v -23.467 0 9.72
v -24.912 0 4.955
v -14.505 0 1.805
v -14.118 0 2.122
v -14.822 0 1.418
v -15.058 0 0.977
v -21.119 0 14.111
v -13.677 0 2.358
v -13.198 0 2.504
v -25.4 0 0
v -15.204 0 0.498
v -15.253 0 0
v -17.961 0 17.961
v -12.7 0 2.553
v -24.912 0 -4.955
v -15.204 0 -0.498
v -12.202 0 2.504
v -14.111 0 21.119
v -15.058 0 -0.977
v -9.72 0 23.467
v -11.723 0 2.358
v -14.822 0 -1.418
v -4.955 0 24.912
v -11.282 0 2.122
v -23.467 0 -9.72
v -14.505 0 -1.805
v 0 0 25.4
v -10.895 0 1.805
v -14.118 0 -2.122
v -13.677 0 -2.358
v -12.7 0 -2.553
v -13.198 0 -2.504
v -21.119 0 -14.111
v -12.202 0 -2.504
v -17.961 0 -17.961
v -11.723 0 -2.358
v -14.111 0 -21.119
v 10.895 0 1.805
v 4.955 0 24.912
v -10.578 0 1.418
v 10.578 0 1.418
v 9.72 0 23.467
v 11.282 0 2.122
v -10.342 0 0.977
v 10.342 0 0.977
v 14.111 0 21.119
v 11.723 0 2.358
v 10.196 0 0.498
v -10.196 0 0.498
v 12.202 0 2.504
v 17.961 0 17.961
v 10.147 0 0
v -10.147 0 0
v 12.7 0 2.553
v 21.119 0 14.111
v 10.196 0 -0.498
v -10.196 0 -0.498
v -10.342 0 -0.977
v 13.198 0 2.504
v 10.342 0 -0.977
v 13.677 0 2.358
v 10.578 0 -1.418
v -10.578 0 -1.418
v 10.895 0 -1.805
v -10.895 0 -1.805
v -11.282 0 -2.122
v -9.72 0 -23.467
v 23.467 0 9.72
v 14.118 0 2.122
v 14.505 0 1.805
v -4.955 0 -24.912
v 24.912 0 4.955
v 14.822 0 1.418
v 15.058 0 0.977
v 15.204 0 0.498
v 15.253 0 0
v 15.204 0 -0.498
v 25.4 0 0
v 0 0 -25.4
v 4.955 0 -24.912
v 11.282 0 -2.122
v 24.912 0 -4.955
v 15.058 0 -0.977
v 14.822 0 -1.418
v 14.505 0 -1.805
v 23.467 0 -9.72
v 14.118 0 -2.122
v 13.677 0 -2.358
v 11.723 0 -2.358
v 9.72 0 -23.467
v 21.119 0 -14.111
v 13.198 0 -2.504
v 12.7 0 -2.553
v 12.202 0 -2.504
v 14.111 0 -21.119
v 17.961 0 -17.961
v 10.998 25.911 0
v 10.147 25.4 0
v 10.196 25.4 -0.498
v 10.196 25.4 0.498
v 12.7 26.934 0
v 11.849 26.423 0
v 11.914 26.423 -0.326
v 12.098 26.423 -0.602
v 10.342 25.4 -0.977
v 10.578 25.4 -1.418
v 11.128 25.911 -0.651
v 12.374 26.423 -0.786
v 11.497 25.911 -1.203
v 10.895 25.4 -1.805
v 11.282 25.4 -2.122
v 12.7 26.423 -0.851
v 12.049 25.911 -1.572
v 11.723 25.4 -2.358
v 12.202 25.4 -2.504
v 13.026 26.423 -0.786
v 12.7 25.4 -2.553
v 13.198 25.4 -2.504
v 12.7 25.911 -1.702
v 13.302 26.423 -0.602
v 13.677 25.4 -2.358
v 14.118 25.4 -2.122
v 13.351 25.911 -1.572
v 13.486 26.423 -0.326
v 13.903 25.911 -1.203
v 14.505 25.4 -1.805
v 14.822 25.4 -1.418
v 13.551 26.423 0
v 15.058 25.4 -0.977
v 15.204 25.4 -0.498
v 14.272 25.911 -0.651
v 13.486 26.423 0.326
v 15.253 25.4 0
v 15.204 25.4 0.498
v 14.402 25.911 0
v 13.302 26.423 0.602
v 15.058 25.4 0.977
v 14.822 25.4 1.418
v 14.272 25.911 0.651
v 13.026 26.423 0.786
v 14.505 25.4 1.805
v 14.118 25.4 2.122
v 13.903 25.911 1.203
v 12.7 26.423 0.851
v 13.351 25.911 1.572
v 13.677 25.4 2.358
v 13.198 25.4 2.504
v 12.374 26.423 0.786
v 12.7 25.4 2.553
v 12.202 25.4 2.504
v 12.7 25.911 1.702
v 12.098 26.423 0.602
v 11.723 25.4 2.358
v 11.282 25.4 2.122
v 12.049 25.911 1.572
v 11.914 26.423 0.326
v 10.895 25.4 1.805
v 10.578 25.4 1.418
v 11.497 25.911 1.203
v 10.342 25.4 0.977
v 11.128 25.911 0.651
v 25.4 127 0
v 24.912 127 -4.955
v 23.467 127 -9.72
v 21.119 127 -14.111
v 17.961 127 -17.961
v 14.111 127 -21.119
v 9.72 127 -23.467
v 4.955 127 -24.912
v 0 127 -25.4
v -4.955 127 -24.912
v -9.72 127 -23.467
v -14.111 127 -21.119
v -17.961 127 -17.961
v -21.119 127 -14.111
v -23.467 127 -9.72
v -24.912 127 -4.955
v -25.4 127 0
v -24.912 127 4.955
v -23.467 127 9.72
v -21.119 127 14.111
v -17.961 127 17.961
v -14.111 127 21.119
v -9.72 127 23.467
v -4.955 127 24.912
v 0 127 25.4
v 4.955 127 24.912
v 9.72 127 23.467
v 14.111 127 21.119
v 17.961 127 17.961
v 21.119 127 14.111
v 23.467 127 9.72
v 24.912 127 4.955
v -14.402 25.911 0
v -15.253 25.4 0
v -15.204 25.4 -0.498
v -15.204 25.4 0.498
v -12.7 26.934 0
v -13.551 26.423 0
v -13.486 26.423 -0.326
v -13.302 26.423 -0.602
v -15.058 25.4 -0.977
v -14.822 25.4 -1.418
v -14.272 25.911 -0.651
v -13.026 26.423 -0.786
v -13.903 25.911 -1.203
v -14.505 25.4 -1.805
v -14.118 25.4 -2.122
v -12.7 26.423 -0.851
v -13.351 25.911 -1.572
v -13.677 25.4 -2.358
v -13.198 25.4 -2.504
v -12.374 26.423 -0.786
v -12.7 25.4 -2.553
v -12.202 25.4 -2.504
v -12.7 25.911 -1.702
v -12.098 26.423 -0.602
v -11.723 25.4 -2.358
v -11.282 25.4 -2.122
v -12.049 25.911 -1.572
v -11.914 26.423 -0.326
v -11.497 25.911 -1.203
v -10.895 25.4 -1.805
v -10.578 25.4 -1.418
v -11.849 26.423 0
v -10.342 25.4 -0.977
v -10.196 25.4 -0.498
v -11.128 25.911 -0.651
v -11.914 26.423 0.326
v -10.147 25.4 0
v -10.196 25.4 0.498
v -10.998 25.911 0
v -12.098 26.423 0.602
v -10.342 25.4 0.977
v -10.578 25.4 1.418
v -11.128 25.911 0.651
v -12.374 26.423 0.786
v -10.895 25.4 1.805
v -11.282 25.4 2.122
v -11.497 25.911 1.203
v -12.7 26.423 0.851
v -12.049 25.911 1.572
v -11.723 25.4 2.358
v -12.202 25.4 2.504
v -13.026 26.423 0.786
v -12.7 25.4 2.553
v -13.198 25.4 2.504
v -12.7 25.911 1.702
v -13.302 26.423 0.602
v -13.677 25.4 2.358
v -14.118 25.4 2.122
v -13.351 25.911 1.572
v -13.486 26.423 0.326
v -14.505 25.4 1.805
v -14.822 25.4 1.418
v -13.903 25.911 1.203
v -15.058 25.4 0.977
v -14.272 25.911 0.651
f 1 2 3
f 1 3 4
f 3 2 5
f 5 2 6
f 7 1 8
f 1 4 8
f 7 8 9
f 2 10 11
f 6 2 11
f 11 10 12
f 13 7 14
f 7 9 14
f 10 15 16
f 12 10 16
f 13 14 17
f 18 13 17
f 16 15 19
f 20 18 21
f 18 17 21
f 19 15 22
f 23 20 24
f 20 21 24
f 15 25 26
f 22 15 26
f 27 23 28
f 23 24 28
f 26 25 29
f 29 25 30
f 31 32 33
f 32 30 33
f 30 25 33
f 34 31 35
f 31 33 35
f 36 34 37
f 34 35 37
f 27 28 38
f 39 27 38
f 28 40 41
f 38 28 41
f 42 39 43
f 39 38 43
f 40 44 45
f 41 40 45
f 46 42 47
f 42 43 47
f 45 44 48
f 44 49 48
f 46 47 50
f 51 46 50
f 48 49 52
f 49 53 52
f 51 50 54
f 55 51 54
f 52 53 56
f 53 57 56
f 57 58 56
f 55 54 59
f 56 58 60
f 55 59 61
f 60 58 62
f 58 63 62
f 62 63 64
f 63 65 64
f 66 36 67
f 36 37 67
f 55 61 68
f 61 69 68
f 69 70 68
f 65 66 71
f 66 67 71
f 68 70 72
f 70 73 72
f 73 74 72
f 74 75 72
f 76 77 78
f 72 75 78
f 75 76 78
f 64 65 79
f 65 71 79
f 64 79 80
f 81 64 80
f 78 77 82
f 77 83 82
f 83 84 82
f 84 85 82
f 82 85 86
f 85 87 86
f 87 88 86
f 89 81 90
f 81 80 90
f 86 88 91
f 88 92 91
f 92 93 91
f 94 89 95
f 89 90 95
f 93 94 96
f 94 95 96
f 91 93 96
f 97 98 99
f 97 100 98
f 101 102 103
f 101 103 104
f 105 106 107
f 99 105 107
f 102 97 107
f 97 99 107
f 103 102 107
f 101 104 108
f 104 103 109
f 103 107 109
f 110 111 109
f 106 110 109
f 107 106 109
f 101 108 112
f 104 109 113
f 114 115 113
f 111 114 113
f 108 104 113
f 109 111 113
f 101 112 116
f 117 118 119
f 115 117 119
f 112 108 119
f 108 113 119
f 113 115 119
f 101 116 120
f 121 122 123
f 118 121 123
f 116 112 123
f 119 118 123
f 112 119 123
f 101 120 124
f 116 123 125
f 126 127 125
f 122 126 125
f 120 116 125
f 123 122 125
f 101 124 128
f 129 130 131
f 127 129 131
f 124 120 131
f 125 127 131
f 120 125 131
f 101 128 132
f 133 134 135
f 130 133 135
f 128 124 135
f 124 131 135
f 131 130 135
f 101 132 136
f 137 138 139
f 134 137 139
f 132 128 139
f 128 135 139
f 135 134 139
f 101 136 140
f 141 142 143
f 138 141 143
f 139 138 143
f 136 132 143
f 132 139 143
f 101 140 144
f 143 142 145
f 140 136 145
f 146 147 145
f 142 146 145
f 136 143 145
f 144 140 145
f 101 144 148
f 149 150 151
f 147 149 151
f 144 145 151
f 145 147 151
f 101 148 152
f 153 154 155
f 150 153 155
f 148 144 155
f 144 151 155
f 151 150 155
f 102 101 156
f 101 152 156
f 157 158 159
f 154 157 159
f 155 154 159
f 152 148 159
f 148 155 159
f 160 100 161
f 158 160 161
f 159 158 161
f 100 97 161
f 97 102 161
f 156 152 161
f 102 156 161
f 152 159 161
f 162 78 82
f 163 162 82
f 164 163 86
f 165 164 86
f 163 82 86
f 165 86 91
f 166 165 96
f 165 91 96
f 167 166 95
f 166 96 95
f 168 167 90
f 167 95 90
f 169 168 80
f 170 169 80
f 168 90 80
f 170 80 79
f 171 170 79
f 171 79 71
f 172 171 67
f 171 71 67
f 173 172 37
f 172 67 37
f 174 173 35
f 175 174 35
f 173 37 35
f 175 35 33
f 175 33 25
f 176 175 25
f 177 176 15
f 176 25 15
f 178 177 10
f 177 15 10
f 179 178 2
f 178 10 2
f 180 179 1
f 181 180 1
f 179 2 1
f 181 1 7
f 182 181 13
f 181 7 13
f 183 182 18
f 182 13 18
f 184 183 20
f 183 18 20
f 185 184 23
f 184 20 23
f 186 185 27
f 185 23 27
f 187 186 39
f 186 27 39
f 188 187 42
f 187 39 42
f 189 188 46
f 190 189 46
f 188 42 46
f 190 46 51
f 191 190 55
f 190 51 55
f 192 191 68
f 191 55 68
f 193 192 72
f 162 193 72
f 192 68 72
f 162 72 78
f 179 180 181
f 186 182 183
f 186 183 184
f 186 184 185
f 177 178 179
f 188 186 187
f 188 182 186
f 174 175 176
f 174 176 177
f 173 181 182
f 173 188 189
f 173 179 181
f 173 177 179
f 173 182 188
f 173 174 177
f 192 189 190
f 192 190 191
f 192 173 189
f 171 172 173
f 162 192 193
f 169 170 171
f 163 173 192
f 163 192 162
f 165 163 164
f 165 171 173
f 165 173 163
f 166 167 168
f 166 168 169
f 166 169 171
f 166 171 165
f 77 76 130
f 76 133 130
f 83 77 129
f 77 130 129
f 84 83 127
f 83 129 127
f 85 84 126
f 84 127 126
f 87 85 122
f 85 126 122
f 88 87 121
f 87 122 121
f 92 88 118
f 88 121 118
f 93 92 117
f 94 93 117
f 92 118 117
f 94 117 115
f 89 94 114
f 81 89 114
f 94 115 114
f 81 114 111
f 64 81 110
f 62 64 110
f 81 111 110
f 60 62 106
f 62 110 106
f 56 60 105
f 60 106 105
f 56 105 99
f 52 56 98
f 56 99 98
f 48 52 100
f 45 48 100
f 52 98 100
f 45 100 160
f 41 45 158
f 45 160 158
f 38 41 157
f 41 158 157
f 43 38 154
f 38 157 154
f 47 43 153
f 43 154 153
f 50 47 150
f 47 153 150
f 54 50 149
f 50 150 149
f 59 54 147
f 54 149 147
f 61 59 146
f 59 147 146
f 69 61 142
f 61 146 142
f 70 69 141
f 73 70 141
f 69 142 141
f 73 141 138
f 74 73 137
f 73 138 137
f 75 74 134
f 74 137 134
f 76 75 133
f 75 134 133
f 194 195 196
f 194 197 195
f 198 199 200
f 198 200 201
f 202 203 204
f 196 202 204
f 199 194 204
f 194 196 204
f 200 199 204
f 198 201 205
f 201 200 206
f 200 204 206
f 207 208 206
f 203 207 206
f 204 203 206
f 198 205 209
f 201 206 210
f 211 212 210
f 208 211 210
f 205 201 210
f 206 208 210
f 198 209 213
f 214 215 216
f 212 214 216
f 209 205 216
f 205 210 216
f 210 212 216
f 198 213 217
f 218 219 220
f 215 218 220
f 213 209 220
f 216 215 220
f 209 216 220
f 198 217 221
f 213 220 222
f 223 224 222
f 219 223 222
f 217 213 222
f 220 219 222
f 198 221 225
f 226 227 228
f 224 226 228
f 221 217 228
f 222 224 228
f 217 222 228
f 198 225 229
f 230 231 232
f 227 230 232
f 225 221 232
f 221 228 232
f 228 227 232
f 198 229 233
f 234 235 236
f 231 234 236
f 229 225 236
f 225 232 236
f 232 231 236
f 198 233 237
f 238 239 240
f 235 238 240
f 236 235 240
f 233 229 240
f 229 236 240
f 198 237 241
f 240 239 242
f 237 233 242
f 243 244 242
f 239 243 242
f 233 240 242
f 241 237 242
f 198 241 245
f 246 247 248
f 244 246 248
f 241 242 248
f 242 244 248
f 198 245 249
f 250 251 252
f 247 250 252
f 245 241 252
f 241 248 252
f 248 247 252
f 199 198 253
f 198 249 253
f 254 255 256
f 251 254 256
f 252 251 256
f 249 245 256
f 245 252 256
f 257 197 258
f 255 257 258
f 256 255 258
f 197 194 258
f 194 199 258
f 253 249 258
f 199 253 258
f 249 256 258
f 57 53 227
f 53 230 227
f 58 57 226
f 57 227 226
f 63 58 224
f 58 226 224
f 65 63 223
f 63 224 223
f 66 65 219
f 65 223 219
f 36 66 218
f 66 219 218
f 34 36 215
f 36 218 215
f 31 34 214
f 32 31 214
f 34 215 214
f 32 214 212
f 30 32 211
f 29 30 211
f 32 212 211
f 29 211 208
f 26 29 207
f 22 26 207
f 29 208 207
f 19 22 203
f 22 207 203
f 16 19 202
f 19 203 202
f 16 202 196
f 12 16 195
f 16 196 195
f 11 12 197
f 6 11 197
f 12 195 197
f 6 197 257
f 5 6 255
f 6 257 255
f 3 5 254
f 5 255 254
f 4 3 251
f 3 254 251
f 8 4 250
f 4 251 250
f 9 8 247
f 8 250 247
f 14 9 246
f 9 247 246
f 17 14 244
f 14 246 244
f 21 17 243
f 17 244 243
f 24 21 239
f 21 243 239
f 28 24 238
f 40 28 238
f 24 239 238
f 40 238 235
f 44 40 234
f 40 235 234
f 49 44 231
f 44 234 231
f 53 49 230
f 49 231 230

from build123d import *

# Parameters (mm, degrees)
SKETCH1_R                   = 25.4
BOSS_EXTRUDE1_DEPTH         = 127
F_1_4_20_TAPPED_HOLE1_D     = 5.1054
F_1_4_20_TAPPED_HOLE1_DEPTH = 25.4
F_1_4_20_TAPPED_HOLE1_TIP   = 1.533816902


with BuildPart() as part:
    # Sketch1 → Boss-Extrude1 (new body)
    with BuildSketch(Plane(origin=(0, 0, 0), x_dir=(1, 0, 0), z_dir=(0, 1, 0))):
        Circle(SKETCH1_R)
    extrude(amount=BOSS_EXTRUDE1_DEPTH)

    # 1/4-20 Tapped Hole1
    with Locations(Plane(origin=(0, 0, 0), x_dir=(-1, 0, 0), z_dir=(0, -1, 0))):
        with Locations((12.7, 0), (-12.7, 0)):
            Hole(F_1_4_20_TAPPED_HOLE1_D / 2, depth=F_1_4_20_TAPPED_HOLE1_DEPTH)
            with Locations((0, 0, -(F_1_4_20_TAPPED_HOLE1_DEPTH + F_1_4_20_TAPPED_HOLE1_TIP / 2))):  # 118° drill point
                Cone(0, F_1_4_20_TAPPED_HOLE1_D / 2, F_1_4_20_TAPPED_HOLE1_TIP, mode=Mode.SUBTRACT)


solid = part.part
